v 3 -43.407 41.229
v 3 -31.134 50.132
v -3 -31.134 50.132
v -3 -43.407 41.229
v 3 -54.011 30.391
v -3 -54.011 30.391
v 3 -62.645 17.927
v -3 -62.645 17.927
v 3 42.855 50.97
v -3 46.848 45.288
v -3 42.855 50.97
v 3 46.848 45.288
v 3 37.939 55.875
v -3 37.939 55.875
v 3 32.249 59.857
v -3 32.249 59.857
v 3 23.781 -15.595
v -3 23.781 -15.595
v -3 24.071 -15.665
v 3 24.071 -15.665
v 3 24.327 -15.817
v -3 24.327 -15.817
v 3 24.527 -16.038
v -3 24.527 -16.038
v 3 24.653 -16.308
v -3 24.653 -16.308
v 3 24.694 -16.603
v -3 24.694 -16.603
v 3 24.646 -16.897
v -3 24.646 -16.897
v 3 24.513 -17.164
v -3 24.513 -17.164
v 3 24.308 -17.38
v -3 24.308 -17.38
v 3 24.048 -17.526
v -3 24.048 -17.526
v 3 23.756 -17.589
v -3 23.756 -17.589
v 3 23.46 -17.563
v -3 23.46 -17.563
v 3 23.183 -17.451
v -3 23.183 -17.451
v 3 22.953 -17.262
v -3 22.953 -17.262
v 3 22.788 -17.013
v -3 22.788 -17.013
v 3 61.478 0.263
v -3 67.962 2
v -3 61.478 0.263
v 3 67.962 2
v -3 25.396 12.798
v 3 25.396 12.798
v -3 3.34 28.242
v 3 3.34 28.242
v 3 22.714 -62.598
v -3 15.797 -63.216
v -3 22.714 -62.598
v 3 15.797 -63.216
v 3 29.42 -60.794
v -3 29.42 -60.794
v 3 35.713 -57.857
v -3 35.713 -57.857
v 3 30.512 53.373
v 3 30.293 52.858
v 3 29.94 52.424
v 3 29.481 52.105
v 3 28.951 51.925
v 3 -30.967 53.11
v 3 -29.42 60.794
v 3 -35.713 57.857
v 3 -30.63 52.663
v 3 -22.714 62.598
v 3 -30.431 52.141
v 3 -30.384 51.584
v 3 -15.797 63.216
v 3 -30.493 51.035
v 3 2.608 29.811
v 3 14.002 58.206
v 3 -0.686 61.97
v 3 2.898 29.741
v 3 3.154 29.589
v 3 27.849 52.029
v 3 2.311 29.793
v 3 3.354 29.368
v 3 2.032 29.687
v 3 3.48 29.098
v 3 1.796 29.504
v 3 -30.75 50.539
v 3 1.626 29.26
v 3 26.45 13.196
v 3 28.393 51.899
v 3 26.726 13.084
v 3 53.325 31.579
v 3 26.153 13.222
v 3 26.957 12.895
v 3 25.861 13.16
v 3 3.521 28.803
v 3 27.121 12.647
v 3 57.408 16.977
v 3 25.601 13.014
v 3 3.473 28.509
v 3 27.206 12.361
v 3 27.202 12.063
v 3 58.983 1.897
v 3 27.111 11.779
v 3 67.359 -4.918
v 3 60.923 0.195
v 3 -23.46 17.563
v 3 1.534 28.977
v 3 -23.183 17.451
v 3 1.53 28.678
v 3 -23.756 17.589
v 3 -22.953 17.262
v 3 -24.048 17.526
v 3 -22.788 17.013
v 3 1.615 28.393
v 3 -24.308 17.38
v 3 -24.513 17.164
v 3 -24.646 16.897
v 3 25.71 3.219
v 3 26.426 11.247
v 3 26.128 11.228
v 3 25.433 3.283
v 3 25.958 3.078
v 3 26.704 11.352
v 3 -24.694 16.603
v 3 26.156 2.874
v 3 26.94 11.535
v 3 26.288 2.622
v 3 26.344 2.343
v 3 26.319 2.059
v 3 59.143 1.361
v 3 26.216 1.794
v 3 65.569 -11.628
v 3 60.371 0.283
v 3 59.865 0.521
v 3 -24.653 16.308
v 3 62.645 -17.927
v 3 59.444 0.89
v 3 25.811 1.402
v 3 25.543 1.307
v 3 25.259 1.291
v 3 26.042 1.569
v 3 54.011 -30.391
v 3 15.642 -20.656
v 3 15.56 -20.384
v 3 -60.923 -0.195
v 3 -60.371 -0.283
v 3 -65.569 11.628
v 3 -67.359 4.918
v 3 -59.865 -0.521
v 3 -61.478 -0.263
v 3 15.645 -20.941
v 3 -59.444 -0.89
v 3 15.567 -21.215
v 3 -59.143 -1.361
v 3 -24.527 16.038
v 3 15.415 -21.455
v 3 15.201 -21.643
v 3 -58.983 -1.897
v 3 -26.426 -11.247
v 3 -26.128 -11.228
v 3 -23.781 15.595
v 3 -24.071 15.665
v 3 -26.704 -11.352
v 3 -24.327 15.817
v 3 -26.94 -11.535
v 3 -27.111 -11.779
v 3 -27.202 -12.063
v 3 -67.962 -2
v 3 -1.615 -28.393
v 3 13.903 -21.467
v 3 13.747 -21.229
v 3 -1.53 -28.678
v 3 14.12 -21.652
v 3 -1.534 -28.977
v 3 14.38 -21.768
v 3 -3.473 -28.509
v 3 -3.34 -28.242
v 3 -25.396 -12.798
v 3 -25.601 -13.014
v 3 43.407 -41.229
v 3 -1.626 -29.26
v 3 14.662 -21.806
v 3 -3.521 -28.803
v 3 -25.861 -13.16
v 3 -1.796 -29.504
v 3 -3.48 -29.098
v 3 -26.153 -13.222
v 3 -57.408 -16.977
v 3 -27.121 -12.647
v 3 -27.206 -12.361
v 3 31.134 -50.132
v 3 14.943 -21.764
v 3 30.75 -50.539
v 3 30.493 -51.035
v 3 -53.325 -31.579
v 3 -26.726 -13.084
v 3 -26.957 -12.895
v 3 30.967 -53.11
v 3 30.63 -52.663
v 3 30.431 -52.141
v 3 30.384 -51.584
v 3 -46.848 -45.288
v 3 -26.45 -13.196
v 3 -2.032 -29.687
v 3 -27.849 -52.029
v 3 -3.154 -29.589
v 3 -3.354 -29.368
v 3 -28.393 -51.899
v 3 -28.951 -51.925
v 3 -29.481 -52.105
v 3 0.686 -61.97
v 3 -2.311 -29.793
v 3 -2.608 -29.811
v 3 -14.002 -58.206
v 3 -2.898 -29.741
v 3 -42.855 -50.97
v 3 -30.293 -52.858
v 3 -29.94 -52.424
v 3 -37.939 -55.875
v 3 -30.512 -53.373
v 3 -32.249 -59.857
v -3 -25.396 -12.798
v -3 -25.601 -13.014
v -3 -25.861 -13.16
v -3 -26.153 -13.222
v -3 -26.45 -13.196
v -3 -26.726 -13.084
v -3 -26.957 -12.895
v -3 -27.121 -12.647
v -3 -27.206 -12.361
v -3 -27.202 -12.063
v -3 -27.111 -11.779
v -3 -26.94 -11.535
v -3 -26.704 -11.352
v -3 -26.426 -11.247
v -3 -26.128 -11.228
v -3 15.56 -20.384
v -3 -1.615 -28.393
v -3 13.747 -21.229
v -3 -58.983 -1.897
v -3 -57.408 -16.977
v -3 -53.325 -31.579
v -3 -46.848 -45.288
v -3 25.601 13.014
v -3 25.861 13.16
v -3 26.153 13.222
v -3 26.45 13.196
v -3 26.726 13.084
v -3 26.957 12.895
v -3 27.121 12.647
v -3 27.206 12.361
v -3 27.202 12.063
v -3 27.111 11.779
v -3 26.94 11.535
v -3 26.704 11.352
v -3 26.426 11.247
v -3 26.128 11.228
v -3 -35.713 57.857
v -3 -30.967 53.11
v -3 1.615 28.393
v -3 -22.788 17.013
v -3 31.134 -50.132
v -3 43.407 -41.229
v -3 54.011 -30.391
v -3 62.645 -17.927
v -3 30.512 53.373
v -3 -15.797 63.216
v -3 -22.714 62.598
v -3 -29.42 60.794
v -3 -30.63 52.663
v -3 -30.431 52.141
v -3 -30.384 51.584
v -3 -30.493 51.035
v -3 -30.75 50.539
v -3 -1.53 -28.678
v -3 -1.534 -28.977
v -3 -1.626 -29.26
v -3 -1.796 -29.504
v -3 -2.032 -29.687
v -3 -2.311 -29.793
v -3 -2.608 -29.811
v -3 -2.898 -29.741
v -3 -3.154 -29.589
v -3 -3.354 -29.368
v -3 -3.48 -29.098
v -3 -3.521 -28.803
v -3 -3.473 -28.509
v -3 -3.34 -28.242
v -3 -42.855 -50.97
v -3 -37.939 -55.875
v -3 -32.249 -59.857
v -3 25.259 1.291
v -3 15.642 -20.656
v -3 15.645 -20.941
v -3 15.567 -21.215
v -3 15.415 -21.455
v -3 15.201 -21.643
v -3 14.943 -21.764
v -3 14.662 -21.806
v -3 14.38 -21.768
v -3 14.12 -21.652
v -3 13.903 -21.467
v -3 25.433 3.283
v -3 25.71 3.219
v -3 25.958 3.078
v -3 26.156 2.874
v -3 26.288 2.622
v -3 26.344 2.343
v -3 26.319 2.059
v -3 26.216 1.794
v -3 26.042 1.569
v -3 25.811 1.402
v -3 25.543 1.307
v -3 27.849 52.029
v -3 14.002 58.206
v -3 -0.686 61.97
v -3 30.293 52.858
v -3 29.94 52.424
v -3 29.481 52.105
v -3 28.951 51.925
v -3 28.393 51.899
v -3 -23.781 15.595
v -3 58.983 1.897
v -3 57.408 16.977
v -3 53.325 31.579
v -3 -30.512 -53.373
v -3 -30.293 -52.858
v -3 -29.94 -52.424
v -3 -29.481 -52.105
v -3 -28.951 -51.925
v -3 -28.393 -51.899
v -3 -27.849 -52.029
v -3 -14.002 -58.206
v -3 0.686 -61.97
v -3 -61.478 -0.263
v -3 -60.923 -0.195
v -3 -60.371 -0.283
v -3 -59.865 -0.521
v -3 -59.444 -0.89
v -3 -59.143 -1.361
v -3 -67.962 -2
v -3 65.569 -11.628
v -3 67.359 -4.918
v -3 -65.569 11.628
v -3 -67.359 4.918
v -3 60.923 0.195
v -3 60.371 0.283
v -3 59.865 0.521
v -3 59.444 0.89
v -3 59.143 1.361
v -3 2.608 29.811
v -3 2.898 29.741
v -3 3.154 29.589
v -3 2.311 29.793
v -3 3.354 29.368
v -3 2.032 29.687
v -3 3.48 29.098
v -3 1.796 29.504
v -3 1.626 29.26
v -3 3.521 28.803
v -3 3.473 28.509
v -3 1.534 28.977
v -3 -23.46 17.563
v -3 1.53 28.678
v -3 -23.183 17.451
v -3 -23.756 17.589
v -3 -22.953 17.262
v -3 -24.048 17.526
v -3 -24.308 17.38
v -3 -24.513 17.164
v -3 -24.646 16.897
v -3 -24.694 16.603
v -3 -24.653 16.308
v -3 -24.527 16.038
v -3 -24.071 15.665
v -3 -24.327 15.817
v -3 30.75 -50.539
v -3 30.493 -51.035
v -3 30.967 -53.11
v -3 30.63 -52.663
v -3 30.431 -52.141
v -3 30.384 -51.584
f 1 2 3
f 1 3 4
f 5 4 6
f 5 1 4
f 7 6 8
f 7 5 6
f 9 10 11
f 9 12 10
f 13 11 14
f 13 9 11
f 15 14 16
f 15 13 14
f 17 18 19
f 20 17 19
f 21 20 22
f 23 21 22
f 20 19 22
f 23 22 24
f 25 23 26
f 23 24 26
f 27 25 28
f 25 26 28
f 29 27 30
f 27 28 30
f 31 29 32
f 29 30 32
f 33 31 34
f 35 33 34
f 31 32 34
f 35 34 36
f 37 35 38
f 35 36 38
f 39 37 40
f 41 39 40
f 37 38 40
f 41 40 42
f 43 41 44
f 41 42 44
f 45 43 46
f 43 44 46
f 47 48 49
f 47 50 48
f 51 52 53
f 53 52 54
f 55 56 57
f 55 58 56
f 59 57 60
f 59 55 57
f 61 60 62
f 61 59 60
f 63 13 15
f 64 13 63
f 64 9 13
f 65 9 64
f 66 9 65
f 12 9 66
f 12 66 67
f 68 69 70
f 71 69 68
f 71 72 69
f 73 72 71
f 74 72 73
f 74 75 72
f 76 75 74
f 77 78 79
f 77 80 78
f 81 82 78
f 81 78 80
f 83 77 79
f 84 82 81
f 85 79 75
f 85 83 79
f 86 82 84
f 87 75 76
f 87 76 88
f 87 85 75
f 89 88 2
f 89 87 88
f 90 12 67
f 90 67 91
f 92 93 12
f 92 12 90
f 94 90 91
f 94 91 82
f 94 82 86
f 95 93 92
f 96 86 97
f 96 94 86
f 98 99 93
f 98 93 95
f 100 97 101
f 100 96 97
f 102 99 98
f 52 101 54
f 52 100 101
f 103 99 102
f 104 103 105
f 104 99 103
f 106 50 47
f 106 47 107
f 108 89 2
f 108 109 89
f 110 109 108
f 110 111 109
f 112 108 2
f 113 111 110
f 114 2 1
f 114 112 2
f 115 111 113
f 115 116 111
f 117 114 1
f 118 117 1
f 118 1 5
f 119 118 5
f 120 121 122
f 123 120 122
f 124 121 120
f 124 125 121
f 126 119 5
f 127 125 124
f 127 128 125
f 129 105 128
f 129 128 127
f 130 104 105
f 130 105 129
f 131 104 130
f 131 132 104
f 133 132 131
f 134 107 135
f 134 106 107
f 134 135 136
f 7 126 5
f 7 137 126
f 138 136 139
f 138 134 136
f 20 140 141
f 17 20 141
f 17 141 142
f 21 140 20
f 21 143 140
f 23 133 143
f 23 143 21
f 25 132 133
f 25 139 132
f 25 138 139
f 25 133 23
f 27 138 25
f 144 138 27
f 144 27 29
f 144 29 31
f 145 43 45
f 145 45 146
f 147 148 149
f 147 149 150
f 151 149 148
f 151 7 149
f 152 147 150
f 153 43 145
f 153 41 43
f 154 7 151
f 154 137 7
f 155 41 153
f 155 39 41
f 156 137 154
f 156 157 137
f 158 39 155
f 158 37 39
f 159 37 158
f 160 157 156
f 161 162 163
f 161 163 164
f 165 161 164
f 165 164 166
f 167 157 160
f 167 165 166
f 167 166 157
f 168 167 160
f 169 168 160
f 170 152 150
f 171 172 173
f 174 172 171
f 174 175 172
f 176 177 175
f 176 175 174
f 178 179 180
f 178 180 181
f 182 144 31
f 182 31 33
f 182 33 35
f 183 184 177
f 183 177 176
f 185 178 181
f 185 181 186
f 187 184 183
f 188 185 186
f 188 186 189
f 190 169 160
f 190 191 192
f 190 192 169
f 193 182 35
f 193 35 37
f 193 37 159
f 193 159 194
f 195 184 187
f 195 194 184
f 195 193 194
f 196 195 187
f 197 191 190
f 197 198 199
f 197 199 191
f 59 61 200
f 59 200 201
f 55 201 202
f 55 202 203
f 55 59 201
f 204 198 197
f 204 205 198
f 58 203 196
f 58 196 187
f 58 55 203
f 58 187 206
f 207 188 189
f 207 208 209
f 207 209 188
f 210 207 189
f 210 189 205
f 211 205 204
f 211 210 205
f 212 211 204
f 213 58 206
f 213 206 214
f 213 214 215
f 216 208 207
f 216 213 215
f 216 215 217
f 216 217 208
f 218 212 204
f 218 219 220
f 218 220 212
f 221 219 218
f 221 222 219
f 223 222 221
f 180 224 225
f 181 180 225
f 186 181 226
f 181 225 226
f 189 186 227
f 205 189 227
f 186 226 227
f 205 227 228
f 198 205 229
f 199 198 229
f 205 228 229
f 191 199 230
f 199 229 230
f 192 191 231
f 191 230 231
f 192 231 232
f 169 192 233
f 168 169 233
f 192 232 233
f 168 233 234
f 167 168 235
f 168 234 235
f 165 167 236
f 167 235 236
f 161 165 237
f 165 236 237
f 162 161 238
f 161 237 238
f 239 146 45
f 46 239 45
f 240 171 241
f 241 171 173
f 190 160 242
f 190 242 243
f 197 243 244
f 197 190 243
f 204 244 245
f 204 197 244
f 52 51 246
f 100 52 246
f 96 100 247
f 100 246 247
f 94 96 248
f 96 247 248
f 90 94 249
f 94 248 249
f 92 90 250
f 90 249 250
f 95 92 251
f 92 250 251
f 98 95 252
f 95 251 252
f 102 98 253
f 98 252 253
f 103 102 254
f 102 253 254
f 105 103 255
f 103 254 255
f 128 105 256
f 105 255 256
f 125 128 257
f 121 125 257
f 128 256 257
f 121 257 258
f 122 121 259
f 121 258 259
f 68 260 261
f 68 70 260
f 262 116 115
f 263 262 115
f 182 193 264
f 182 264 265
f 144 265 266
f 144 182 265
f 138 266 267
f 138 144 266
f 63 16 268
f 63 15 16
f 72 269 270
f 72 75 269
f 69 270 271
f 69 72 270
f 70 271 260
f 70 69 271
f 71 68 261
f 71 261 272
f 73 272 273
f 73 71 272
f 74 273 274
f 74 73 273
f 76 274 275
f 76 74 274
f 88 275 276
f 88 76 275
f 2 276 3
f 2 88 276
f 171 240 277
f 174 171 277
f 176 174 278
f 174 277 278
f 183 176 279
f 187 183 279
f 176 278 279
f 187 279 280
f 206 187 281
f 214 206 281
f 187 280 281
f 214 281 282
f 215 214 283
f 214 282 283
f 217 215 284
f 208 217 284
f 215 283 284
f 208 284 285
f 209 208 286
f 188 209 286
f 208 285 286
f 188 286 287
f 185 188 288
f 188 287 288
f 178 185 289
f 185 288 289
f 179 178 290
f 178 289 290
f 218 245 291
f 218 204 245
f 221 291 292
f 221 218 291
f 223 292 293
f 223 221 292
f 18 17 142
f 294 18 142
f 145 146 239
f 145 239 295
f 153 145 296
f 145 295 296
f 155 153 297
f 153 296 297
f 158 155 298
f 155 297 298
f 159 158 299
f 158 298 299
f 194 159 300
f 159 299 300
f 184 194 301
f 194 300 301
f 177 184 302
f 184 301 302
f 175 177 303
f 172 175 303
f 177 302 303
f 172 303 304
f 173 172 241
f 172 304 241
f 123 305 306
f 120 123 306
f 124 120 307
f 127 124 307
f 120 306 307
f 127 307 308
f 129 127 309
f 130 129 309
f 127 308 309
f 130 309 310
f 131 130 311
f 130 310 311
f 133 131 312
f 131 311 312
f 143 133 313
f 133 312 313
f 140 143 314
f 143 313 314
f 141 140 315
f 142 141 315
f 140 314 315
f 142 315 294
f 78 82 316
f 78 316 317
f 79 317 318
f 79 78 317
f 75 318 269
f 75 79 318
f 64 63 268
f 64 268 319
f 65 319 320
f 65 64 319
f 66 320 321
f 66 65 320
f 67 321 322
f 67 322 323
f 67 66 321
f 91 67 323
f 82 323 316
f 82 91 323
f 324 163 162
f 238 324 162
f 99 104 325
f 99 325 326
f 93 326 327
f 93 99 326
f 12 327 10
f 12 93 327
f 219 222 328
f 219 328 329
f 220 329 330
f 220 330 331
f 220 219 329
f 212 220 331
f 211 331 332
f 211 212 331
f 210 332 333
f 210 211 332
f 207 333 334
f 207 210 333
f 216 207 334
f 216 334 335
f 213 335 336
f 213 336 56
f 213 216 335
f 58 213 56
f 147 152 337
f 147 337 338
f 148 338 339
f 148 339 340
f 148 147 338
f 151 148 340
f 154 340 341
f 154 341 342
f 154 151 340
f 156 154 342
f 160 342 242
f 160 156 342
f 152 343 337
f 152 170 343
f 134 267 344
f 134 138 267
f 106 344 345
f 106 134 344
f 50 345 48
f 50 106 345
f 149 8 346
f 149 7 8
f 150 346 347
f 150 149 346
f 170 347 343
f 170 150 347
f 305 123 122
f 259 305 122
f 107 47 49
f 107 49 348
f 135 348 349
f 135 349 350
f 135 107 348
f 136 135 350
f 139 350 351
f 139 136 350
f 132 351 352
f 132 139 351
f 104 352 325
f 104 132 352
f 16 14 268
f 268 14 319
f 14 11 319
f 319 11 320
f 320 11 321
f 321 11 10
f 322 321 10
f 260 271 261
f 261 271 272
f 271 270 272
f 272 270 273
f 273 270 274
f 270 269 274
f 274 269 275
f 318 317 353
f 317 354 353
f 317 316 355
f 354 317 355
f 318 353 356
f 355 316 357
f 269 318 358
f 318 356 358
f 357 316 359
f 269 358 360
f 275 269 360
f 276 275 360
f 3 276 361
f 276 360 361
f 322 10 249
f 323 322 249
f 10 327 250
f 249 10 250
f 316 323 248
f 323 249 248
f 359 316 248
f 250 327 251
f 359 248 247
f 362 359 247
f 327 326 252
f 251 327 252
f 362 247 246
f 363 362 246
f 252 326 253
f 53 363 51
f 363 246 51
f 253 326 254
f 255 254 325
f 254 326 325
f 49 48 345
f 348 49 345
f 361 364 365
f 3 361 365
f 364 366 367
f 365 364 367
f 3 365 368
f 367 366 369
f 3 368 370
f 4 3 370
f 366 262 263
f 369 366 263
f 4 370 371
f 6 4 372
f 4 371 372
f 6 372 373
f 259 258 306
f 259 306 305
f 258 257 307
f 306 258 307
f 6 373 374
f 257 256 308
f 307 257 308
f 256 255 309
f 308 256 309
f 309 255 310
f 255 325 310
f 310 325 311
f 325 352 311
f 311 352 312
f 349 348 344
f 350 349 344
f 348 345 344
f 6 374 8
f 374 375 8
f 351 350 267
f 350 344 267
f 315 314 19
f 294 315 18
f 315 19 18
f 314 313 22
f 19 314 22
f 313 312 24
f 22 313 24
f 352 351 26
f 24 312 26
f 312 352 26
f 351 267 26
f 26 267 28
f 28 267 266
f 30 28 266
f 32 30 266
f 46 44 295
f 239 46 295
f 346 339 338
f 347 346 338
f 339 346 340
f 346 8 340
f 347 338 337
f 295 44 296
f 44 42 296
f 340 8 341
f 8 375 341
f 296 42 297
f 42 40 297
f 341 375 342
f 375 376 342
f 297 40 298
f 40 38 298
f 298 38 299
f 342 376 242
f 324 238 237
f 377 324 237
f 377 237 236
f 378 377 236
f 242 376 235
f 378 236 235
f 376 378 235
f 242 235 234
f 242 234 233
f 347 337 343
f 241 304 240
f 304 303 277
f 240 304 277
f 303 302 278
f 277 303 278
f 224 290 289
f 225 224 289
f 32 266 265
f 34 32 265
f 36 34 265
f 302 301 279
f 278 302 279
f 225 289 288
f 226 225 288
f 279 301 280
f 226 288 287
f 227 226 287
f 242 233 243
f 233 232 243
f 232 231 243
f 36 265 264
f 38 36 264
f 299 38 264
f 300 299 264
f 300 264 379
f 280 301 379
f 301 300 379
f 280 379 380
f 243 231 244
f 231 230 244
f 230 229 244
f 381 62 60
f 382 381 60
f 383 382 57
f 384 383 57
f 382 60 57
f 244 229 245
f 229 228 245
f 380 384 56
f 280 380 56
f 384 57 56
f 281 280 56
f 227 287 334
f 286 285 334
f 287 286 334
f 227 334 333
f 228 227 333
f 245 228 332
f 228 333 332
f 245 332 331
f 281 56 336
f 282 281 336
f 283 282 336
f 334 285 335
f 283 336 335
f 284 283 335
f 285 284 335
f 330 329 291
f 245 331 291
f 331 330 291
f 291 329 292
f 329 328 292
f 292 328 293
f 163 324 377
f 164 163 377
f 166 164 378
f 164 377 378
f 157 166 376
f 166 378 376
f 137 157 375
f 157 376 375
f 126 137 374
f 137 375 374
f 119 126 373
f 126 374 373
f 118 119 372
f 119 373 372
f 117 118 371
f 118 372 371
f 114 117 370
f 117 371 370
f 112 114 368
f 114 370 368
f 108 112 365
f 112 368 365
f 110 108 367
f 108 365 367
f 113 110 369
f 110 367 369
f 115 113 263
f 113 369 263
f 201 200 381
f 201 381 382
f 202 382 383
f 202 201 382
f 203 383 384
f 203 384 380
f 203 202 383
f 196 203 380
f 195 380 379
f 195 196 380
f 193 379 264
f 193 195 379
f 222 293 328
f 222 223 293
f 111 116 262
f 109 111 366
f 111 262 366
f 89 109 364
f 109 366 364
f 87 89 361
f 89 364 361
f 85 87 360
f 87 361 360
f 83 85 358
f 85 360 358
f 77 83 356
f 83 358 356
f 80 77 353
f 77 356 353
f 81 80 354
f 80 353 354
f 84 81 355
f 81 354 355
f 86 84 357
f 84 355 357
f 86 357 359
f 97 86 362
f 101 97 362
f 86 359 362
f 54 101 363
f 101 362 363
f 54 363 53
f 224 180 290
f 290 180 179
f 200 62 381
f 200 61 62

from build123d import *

# Parameters (mm, degrees)
SKETCH1_R                = 59
EXTRUDE1_DEPTH           = 3
EXTRUDE2_DEPTH           = 3
CIRPATTERN1_COUNT        = 6
F_2_0_2_DIAMETER_HOLE1_D = 2
F_2_0_2_DIAMETER_HOLE3_D = 2
CIRPATTERN2_COUNT        = 2
CIRPATTERN2_ANGLE        = 60


with BuildPart() as part:
    # Sketch1 → Extrude1 (new, symmetric)
    with BuildSketch(Plane(origin=(0, 0, 0), x_dir=(0, 0, -1), z_dir=(1, 0, 0))):
        Circle(SKETCH1_R)
        Polygon((16.590840947, 23.694176429), (-12.224338236, 26.215177945), (-28.815179183, 2.521001516), (-16.590840947, -23.694176429), (12.224338236, -26.215177945), (28.815179183, -2.521001516), align=None, mode=Mode.SUBTRACT)
    extrude(amount=EXTRUDE1_DEPTH, both=True)

    # Sketch2 → Extrude2 (add, symmetric)
    with BuildSketch(Plane(origin=(0, 0, 0), x_dir=(0, 0, -1), z_dir=(1, 0, 0))):
        with BuildLine():
            Line((-2, 67.961805723), (-0.262709442, 61.478149092))
            ThreePointArc((-0.262709442, 61.478149092), (-0.58620663, 59.77173183), (-2.122608272, 58.961805723))
            ThreePointArc((-2.122608272, 58.961805723), (28.679663449, 51.560419941), (51.21368579, 29.294340542))
            ThreePointArc((51.21368579, 29.294340542), (36.791707484, 48.186627241), (17.927108603, 62.644803614))
            ThreePointArc((17.927108603, 62.644803614), (8.312130826, 66.609702921), (-2, 67.961805723))
        make_face()
    extrude2 = extrude(amount=EXTRUDE2_DEPTH, both=True)

    # CirPattern1: Extrude2 ×6 about axis
    cirpattern1_axis = Axis((0, 0, 0), (1, 0, 0))
    for i in range(1, CIRPATTERN1_COUNT):
        add(extrude2.rotate(cirpattern1_axis, i * 360 / CIRPATTERN1_COUNT))

    # Ø2.0 (2) Diameter Hole1 (through all)
    with Locations(Plane(origin=(3, 0, 0), x_dir=(0, 0, -1), z_dir=(1, 0, 0))):
        with Locations((-12.224338236, 26.215177945), (16.590840947, 23.694176429), (28.815179183, -2.521001516), (12.224338236, -26.215177945), (-16.590840947, -23.694176429), (-28.815179183, 2.521001516)):
            Hole(F_2_0_2_DIAMETER_HOLE1_D / 2)

    # Ø2.0 (2) Diameter Hole3 (through all)
    with Locations(Plane(origin=(3, 0, 0), x_dir=(0, 0, -1), z_dir=(1, 0, 0))):
        with Locations((-2.287213609, 25.345792192)):
            f_2_0_2_diameter_hole3 = Hole(F_2_0_2_DIAMETER_HOLE3_D / 2)

    # CirPattern2: Ø2.0 (2) Diameter Hole3 ×2 about axis
    cirpattern2_axis = Axis((-5.5, 0, 0), (-1, 0, 0))
    for i in range(1, CIRPATTERN2_COUNT):
        add(f_2_0_2_diameter_hole3.rotate(cirpattern2_axis, i * CIRPATTERN2_ANGLE / (CIRPATTERN2_COUNT - 1)), mode=Mode.SUBTRACT)


solid = part.part
